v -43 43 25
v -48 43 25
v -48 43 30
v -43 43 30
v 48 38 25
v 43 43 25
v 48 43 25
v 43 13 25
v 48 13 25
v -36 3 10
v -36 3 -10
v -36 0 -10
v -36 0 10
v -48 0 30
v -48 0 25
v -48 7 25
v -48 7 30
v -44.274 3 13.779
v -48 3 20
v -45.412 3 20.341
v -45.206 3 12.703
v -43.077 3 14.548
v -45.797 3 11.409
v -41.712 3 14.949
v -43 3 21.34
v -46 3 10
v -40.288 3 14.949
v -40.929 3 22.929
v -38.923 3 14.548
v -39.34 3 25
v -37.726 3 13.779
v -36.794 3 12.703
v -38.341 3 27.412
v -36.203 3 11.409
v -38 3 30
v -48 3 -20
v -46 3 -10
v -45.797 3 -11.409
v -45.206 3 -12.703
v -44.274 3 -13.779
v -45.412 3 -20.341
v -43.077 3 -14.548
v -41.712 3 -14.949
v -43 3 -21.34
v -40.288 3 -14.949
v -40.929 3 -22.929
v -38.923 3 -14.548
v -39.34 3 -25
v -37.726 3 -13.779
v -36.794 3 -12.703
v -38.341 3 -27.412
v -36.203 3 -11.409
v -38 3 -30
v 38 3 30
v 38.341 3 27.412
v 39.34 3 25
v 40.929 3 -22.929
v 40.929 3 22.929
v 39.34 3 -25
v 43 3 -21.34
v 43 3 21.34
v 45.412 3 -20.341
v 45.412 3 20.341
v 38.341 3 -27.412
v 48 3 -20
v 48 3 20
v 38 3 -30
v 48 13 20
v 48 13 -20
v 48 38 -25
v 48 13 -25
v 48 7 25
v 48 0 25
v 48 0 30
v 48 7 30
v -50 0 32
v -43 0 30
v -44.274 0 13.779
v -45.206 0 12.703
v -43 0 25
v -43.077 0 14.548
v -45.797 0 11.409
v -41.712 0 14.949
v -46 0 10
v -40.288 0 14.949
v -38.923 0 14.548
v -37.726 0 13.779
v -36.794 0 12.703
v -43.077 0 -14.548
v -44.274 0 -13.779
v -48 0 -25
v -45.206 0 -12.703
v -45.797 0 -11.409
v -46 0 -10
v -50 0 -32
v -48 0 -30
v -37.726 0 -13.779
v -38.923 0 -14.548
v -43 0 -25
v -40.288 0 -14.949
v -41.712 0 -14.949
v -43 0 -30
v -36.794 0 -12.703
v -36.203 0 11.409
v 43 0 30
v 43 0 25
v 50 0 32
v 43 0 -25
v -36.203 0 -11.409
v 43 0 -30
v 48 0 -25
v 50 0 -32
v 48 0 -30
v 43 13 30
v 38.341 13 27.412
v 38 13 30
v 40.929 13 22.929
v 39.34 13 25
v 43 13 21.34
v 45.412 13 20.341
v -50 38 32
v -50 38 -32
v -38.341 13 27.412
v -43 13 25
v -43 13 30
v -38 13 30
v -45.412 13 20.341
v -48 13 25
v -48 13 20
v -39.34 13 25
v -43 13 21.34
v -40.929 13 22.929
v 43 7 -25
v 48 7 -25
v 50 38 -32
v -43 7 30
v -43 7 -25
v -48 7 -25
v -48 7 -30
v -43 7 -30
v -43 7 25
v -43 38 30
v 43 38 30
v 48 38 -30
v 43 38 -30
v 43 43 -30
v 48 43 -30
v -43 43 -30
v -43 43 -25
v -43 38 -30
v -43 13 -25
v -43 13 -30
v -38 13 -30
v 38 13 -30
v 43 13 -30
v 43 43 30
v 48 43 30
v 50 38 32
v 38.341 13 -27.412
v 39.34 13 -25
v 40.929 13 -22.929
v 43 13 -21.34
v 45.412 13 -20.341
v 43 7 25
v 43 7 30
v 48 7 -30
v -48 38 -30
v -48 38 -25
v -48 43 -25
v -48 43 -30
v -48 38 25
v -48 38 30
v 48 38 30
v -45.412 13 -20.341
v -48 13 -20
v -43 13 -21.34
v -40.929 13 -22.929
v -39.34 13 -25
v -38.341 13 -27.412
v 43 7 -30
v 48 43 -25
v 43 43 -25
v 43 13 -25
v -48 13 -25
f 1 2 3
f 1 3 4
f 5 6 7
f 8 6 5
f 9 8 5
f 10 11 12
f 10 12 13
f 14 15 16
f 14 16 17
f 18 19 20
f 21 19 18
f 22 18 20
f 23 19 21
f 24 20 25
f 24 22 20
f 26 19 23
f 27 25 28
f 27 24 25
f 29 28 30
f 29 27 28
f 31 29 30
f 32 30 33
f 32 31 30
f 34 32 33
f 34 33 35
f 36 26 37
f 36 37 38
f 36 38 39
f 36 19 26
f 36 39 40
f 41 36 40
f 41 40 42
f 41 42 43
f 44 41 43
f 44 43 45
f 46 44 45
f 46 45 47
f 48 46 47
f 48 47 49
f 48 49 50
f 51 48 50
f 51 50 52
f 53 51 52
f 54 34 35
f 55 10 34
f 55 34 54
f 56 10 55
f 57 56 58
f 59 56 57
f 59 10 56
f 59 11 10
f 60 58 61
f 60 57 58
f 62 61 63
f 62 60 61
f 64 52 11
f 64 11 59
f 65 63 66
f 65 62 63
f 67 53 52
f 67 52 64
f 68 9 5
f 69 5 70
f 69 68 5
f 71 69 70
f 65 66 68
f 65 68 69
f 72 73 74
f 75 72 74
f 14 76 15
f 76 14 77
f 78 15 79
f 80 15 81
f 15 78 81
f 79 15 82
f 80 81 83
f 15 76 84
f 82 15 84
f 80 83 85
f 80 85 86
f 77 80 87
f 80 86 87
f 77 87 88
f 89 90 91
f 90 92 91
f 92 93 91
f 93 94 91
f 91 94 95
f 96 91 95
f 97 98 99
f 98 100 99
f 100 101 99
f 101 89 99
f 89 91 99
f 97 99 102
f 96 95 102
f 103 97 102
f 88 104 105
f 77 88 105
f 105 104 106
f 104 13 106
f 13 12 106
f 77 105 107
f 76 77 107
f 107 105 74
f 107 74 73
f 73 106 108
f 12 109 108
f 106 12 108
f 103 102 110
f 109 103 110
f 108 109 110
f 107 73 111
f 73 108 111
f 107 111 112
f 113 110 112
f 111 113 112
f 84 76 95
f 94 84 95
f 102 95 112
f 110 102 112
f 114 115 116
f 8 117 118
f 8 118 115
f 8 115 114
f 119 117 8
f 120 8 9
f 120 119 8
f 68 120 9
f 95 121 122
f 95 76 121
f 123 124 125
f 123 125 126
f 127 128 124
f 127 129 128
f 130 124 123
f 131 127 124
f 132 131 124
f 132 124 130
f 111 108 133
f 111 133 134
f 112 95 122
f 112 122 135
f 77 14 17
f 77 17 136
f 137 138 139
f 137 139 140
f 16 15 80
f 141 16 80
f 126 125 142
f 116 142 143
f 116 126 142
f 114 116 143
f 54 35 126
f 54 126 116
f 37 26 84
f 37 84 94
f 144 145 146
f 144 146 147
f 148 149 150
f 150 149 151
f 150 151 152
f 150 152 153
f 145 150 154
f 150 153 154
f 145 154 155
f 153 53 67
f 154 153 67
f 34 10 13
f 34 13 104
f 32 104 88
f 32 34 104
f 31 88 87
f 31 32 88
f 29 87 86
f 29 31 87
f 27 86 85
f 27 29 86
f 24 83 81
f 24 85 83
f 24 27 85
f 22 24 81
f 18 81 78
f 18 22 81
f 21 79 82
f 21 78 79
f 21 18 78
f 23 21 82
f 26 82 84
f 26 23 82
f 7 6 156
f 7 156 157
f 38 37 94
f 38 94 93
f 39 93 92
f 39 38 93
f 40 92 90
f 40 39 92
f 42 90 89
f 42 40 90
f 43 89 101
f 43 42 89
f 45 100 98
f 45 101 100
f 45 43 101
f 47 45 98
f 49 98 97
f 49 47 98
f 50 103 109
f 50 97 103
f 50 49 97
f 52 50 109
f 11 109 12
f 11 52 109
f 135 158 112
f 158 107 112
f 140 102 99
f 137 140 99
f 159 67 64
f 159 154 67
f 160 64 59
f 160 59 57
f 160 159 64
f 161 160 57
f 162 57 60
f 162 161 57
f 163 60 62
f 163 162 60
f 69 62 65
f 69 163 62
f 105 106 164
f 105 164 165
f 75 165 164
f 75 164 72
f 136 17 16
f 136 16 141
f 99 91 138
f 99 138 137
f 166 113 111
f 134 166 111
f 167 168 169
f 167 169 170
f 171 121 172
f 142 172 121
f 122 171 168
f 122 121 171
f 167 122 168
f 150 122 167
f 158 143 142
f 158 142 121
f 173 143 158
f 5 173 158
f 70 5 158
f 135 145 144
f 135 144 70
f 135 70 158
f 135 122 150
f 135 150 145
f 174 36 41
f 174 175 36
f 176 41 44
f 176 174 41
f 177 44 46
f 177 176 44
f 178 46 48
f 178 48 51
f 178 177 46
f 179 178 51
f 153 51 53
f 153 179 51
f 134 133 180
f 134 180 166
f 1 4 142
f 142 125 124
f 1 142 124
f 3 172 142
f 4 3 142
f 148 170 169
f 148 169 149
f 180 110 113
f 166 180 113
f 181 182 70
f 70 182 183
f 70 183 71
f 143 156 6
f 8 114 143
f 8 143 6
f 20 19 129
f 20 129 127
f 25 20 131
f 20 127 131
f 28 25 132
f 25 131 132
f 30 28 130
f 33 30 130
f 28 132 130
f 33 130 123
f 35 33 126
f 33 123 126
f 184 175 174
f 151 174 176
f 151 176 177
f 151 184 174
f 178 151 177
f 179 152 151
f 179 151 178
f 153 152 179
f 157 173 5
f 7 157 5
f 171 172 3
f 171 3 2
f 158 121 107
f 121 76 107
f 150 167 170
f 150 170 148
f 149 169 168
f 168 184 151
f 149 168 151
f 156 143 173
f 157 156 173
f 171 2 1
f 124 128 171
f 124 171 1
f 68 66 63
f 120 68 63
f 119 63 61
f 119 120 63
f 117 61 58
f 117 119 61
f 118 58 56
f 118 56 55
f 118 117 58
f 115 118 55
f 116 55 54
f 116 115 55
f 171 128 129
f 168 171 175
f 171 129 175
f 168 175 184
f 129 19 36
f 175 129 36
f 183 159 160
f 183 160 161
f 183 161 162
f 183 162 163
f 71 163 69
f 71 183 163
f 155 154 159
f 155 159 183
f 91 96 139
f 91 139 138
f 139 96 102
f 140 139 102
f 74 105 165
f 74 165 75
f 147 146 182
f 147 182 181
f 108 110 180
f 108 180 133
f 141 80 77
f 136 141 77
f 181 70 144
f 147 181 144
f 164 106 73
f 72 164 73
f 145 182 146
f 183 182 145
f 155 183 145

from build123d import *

# Parameters (mm, degrees)
SKETCH1_W                = 100
SKETCH1_H                = 64
BOSS_EXTRUDE1_DEPTH      = 3
SKETCH2_W                = 100
SKETCH2_H                = 64
SKETCH2_W_2              = 96
SKETCH2_H_2              = 60
BOSS_EXTRUDE2_DEPTH      = 35
BOSS_EXTRUDE9_DEPTH      = 5
BOSS_EXTRUDE9_DEPTH_BACK = 37
SKETCH12_W               = 5
SKETCH12_H               = 5
CUT_EXTRUDE6_DEPTH       = 72.582120673
BOSS_EXTRUDE11_DEPTH     = 10
SKETCH19_W               = 5
SKETCH19_H               = 5
CUT_EXTRUDE7_DEPTH       = 7
FILLET2_R                = 10


with BuildPart() as part:
    # Sketch1 → Boss-Extrude1 (new body)
    with BuildSketch(Plane(origin=(0, 0, 0), x_dir=(1, 0, 0), z_dir=(0, 1, 0))):
        Rectangle(SKETCH1_W, SKETCH1_H)
    extrude(amount=BOSS_EXTRUDE1_DEPTH)

    # Sketch2 → Boss-Extrude2 (add)
    with BuildSketch(Plane(origin=(0, 3, 0), x_dir=(1, 0, 0), z_dir=(0, 1, 0))):
        Rectangle(SKETCH2_W, SKETCH2_H)
        Rectangle(SKETCH2_W_2, SKETCH2_H_2, mode=Mode.SUBTRACT)
    extrude(amount=BOSS_EXTRUDE2_DEPTH)

    # Sketch12 → Boss-Extrude9 (add, two sides: drawn at the far end of the back side and taken through both)
    with BuildSketch(Plane(origin=(0, 38, 0), x_dir=(1, 0, 0), z_dir=(0, 1, 0)).offset(-BOSS_EXTRUDE9_DEPTH_BACK)):
        with Locations((-45.5, 27.5)):
            Rectangle(SKETCH12_W, SKETCH12_H)
        with Locations((45.5, 27.5)):
            Rectangle(SKETCH12_W, SKETCH12_H)
        with Locations((45.5, -27.5)):
            Rectangle(SKETCH12_W, SKETCH12_H)
        with Locations((-45.5, -27.5)):
            Rectangle(SKETCH12_W, SKETCH12_H)
    extrude(amount=BOSS_EXTRUDE9_DEPTH + BOSS_EXTRUDE9_DEPTH_BACK)

    # Sketch14 → Cut-Extrude6 (cut, through all)
    with BuildSketch(Plane(origin=(0, 3, 0), x_dir=(1, 0, 0), z_dir=(0, 1, 0))):
        with BuildLine():
            Line((-46, -10), (-46, 10))
            ThreePointArc((-46, 10), (-41, 15), (-36, 10))
            Line((-36, 10), (-36, -10))
            ThreePointArc((-36, -10), (-41, -15), (-46, -10))
        make_face()
    extrude(amount=-CUT_EXTRUDE6_DEPTH, mode=Mode.SUBTRACT)

    # Sketch17 → Boss-Extrude11 (add)
    with BuildSketch(Plane(origin=(0, 3, 0), x_dir=(1, 0, 0), z_dir=(0, 1, 0))):
        Polygon((-38, 30), (-43, 30), (-43, 25), (-48, 25), (-48, 20), (-38, 20), align=None)
        Polygon((43, 30), (38, 30), (38, 20), (48, 20), (48, 25), (43, 25), align=None)
        Polygon((48, -25), (48, -20), (38, -20), (38, -30), (43, -30), (43, -25), align=None)
        Polygon((-38, -20), (-48, -20), (-48, -25), (-43, -25), (-43, -30), (-38, -30), align=None)
    extrude(amount=BOSS_EXTRUDE11_DEPTH)

    # Sketch19 → Cut-Extrude7 (cut)
    with BuildSketch(Plane.XZ):
        with Locations((-45.5, 27.5)):
            Rectangle(SKETCH19_W, SKETCH19_H)
        with Locations((45.5, 27.5)):
            Rectangle(SKETCH19_W, SKETCH19_H)
        with Locations((45.5, -27.5)):
            Rectangle(SKETCH19_W, SKETCH19_H)
        with Locations((-45.5, -27.5)):
            Rectangle(SKETCH19_W, SKETCH19_H)
    extrude(amount=-CUT_EXTRUDE7_DEPTH, mode=Mode.SUBTRACT)

    # Fillet2
    fillet2_edges = [part.edges().sort_by_distance(p)[0] for p in [
        (-38, 8, 20),
        (38, 8, -20),
        (38, 8, 20),
        (-38, 8, -20),
    ]]
    fillet(fillet2_edges, radius=FILLET2_R - 0.0001)  # a hair under: the kernel refuses the full size


solid = part.part
